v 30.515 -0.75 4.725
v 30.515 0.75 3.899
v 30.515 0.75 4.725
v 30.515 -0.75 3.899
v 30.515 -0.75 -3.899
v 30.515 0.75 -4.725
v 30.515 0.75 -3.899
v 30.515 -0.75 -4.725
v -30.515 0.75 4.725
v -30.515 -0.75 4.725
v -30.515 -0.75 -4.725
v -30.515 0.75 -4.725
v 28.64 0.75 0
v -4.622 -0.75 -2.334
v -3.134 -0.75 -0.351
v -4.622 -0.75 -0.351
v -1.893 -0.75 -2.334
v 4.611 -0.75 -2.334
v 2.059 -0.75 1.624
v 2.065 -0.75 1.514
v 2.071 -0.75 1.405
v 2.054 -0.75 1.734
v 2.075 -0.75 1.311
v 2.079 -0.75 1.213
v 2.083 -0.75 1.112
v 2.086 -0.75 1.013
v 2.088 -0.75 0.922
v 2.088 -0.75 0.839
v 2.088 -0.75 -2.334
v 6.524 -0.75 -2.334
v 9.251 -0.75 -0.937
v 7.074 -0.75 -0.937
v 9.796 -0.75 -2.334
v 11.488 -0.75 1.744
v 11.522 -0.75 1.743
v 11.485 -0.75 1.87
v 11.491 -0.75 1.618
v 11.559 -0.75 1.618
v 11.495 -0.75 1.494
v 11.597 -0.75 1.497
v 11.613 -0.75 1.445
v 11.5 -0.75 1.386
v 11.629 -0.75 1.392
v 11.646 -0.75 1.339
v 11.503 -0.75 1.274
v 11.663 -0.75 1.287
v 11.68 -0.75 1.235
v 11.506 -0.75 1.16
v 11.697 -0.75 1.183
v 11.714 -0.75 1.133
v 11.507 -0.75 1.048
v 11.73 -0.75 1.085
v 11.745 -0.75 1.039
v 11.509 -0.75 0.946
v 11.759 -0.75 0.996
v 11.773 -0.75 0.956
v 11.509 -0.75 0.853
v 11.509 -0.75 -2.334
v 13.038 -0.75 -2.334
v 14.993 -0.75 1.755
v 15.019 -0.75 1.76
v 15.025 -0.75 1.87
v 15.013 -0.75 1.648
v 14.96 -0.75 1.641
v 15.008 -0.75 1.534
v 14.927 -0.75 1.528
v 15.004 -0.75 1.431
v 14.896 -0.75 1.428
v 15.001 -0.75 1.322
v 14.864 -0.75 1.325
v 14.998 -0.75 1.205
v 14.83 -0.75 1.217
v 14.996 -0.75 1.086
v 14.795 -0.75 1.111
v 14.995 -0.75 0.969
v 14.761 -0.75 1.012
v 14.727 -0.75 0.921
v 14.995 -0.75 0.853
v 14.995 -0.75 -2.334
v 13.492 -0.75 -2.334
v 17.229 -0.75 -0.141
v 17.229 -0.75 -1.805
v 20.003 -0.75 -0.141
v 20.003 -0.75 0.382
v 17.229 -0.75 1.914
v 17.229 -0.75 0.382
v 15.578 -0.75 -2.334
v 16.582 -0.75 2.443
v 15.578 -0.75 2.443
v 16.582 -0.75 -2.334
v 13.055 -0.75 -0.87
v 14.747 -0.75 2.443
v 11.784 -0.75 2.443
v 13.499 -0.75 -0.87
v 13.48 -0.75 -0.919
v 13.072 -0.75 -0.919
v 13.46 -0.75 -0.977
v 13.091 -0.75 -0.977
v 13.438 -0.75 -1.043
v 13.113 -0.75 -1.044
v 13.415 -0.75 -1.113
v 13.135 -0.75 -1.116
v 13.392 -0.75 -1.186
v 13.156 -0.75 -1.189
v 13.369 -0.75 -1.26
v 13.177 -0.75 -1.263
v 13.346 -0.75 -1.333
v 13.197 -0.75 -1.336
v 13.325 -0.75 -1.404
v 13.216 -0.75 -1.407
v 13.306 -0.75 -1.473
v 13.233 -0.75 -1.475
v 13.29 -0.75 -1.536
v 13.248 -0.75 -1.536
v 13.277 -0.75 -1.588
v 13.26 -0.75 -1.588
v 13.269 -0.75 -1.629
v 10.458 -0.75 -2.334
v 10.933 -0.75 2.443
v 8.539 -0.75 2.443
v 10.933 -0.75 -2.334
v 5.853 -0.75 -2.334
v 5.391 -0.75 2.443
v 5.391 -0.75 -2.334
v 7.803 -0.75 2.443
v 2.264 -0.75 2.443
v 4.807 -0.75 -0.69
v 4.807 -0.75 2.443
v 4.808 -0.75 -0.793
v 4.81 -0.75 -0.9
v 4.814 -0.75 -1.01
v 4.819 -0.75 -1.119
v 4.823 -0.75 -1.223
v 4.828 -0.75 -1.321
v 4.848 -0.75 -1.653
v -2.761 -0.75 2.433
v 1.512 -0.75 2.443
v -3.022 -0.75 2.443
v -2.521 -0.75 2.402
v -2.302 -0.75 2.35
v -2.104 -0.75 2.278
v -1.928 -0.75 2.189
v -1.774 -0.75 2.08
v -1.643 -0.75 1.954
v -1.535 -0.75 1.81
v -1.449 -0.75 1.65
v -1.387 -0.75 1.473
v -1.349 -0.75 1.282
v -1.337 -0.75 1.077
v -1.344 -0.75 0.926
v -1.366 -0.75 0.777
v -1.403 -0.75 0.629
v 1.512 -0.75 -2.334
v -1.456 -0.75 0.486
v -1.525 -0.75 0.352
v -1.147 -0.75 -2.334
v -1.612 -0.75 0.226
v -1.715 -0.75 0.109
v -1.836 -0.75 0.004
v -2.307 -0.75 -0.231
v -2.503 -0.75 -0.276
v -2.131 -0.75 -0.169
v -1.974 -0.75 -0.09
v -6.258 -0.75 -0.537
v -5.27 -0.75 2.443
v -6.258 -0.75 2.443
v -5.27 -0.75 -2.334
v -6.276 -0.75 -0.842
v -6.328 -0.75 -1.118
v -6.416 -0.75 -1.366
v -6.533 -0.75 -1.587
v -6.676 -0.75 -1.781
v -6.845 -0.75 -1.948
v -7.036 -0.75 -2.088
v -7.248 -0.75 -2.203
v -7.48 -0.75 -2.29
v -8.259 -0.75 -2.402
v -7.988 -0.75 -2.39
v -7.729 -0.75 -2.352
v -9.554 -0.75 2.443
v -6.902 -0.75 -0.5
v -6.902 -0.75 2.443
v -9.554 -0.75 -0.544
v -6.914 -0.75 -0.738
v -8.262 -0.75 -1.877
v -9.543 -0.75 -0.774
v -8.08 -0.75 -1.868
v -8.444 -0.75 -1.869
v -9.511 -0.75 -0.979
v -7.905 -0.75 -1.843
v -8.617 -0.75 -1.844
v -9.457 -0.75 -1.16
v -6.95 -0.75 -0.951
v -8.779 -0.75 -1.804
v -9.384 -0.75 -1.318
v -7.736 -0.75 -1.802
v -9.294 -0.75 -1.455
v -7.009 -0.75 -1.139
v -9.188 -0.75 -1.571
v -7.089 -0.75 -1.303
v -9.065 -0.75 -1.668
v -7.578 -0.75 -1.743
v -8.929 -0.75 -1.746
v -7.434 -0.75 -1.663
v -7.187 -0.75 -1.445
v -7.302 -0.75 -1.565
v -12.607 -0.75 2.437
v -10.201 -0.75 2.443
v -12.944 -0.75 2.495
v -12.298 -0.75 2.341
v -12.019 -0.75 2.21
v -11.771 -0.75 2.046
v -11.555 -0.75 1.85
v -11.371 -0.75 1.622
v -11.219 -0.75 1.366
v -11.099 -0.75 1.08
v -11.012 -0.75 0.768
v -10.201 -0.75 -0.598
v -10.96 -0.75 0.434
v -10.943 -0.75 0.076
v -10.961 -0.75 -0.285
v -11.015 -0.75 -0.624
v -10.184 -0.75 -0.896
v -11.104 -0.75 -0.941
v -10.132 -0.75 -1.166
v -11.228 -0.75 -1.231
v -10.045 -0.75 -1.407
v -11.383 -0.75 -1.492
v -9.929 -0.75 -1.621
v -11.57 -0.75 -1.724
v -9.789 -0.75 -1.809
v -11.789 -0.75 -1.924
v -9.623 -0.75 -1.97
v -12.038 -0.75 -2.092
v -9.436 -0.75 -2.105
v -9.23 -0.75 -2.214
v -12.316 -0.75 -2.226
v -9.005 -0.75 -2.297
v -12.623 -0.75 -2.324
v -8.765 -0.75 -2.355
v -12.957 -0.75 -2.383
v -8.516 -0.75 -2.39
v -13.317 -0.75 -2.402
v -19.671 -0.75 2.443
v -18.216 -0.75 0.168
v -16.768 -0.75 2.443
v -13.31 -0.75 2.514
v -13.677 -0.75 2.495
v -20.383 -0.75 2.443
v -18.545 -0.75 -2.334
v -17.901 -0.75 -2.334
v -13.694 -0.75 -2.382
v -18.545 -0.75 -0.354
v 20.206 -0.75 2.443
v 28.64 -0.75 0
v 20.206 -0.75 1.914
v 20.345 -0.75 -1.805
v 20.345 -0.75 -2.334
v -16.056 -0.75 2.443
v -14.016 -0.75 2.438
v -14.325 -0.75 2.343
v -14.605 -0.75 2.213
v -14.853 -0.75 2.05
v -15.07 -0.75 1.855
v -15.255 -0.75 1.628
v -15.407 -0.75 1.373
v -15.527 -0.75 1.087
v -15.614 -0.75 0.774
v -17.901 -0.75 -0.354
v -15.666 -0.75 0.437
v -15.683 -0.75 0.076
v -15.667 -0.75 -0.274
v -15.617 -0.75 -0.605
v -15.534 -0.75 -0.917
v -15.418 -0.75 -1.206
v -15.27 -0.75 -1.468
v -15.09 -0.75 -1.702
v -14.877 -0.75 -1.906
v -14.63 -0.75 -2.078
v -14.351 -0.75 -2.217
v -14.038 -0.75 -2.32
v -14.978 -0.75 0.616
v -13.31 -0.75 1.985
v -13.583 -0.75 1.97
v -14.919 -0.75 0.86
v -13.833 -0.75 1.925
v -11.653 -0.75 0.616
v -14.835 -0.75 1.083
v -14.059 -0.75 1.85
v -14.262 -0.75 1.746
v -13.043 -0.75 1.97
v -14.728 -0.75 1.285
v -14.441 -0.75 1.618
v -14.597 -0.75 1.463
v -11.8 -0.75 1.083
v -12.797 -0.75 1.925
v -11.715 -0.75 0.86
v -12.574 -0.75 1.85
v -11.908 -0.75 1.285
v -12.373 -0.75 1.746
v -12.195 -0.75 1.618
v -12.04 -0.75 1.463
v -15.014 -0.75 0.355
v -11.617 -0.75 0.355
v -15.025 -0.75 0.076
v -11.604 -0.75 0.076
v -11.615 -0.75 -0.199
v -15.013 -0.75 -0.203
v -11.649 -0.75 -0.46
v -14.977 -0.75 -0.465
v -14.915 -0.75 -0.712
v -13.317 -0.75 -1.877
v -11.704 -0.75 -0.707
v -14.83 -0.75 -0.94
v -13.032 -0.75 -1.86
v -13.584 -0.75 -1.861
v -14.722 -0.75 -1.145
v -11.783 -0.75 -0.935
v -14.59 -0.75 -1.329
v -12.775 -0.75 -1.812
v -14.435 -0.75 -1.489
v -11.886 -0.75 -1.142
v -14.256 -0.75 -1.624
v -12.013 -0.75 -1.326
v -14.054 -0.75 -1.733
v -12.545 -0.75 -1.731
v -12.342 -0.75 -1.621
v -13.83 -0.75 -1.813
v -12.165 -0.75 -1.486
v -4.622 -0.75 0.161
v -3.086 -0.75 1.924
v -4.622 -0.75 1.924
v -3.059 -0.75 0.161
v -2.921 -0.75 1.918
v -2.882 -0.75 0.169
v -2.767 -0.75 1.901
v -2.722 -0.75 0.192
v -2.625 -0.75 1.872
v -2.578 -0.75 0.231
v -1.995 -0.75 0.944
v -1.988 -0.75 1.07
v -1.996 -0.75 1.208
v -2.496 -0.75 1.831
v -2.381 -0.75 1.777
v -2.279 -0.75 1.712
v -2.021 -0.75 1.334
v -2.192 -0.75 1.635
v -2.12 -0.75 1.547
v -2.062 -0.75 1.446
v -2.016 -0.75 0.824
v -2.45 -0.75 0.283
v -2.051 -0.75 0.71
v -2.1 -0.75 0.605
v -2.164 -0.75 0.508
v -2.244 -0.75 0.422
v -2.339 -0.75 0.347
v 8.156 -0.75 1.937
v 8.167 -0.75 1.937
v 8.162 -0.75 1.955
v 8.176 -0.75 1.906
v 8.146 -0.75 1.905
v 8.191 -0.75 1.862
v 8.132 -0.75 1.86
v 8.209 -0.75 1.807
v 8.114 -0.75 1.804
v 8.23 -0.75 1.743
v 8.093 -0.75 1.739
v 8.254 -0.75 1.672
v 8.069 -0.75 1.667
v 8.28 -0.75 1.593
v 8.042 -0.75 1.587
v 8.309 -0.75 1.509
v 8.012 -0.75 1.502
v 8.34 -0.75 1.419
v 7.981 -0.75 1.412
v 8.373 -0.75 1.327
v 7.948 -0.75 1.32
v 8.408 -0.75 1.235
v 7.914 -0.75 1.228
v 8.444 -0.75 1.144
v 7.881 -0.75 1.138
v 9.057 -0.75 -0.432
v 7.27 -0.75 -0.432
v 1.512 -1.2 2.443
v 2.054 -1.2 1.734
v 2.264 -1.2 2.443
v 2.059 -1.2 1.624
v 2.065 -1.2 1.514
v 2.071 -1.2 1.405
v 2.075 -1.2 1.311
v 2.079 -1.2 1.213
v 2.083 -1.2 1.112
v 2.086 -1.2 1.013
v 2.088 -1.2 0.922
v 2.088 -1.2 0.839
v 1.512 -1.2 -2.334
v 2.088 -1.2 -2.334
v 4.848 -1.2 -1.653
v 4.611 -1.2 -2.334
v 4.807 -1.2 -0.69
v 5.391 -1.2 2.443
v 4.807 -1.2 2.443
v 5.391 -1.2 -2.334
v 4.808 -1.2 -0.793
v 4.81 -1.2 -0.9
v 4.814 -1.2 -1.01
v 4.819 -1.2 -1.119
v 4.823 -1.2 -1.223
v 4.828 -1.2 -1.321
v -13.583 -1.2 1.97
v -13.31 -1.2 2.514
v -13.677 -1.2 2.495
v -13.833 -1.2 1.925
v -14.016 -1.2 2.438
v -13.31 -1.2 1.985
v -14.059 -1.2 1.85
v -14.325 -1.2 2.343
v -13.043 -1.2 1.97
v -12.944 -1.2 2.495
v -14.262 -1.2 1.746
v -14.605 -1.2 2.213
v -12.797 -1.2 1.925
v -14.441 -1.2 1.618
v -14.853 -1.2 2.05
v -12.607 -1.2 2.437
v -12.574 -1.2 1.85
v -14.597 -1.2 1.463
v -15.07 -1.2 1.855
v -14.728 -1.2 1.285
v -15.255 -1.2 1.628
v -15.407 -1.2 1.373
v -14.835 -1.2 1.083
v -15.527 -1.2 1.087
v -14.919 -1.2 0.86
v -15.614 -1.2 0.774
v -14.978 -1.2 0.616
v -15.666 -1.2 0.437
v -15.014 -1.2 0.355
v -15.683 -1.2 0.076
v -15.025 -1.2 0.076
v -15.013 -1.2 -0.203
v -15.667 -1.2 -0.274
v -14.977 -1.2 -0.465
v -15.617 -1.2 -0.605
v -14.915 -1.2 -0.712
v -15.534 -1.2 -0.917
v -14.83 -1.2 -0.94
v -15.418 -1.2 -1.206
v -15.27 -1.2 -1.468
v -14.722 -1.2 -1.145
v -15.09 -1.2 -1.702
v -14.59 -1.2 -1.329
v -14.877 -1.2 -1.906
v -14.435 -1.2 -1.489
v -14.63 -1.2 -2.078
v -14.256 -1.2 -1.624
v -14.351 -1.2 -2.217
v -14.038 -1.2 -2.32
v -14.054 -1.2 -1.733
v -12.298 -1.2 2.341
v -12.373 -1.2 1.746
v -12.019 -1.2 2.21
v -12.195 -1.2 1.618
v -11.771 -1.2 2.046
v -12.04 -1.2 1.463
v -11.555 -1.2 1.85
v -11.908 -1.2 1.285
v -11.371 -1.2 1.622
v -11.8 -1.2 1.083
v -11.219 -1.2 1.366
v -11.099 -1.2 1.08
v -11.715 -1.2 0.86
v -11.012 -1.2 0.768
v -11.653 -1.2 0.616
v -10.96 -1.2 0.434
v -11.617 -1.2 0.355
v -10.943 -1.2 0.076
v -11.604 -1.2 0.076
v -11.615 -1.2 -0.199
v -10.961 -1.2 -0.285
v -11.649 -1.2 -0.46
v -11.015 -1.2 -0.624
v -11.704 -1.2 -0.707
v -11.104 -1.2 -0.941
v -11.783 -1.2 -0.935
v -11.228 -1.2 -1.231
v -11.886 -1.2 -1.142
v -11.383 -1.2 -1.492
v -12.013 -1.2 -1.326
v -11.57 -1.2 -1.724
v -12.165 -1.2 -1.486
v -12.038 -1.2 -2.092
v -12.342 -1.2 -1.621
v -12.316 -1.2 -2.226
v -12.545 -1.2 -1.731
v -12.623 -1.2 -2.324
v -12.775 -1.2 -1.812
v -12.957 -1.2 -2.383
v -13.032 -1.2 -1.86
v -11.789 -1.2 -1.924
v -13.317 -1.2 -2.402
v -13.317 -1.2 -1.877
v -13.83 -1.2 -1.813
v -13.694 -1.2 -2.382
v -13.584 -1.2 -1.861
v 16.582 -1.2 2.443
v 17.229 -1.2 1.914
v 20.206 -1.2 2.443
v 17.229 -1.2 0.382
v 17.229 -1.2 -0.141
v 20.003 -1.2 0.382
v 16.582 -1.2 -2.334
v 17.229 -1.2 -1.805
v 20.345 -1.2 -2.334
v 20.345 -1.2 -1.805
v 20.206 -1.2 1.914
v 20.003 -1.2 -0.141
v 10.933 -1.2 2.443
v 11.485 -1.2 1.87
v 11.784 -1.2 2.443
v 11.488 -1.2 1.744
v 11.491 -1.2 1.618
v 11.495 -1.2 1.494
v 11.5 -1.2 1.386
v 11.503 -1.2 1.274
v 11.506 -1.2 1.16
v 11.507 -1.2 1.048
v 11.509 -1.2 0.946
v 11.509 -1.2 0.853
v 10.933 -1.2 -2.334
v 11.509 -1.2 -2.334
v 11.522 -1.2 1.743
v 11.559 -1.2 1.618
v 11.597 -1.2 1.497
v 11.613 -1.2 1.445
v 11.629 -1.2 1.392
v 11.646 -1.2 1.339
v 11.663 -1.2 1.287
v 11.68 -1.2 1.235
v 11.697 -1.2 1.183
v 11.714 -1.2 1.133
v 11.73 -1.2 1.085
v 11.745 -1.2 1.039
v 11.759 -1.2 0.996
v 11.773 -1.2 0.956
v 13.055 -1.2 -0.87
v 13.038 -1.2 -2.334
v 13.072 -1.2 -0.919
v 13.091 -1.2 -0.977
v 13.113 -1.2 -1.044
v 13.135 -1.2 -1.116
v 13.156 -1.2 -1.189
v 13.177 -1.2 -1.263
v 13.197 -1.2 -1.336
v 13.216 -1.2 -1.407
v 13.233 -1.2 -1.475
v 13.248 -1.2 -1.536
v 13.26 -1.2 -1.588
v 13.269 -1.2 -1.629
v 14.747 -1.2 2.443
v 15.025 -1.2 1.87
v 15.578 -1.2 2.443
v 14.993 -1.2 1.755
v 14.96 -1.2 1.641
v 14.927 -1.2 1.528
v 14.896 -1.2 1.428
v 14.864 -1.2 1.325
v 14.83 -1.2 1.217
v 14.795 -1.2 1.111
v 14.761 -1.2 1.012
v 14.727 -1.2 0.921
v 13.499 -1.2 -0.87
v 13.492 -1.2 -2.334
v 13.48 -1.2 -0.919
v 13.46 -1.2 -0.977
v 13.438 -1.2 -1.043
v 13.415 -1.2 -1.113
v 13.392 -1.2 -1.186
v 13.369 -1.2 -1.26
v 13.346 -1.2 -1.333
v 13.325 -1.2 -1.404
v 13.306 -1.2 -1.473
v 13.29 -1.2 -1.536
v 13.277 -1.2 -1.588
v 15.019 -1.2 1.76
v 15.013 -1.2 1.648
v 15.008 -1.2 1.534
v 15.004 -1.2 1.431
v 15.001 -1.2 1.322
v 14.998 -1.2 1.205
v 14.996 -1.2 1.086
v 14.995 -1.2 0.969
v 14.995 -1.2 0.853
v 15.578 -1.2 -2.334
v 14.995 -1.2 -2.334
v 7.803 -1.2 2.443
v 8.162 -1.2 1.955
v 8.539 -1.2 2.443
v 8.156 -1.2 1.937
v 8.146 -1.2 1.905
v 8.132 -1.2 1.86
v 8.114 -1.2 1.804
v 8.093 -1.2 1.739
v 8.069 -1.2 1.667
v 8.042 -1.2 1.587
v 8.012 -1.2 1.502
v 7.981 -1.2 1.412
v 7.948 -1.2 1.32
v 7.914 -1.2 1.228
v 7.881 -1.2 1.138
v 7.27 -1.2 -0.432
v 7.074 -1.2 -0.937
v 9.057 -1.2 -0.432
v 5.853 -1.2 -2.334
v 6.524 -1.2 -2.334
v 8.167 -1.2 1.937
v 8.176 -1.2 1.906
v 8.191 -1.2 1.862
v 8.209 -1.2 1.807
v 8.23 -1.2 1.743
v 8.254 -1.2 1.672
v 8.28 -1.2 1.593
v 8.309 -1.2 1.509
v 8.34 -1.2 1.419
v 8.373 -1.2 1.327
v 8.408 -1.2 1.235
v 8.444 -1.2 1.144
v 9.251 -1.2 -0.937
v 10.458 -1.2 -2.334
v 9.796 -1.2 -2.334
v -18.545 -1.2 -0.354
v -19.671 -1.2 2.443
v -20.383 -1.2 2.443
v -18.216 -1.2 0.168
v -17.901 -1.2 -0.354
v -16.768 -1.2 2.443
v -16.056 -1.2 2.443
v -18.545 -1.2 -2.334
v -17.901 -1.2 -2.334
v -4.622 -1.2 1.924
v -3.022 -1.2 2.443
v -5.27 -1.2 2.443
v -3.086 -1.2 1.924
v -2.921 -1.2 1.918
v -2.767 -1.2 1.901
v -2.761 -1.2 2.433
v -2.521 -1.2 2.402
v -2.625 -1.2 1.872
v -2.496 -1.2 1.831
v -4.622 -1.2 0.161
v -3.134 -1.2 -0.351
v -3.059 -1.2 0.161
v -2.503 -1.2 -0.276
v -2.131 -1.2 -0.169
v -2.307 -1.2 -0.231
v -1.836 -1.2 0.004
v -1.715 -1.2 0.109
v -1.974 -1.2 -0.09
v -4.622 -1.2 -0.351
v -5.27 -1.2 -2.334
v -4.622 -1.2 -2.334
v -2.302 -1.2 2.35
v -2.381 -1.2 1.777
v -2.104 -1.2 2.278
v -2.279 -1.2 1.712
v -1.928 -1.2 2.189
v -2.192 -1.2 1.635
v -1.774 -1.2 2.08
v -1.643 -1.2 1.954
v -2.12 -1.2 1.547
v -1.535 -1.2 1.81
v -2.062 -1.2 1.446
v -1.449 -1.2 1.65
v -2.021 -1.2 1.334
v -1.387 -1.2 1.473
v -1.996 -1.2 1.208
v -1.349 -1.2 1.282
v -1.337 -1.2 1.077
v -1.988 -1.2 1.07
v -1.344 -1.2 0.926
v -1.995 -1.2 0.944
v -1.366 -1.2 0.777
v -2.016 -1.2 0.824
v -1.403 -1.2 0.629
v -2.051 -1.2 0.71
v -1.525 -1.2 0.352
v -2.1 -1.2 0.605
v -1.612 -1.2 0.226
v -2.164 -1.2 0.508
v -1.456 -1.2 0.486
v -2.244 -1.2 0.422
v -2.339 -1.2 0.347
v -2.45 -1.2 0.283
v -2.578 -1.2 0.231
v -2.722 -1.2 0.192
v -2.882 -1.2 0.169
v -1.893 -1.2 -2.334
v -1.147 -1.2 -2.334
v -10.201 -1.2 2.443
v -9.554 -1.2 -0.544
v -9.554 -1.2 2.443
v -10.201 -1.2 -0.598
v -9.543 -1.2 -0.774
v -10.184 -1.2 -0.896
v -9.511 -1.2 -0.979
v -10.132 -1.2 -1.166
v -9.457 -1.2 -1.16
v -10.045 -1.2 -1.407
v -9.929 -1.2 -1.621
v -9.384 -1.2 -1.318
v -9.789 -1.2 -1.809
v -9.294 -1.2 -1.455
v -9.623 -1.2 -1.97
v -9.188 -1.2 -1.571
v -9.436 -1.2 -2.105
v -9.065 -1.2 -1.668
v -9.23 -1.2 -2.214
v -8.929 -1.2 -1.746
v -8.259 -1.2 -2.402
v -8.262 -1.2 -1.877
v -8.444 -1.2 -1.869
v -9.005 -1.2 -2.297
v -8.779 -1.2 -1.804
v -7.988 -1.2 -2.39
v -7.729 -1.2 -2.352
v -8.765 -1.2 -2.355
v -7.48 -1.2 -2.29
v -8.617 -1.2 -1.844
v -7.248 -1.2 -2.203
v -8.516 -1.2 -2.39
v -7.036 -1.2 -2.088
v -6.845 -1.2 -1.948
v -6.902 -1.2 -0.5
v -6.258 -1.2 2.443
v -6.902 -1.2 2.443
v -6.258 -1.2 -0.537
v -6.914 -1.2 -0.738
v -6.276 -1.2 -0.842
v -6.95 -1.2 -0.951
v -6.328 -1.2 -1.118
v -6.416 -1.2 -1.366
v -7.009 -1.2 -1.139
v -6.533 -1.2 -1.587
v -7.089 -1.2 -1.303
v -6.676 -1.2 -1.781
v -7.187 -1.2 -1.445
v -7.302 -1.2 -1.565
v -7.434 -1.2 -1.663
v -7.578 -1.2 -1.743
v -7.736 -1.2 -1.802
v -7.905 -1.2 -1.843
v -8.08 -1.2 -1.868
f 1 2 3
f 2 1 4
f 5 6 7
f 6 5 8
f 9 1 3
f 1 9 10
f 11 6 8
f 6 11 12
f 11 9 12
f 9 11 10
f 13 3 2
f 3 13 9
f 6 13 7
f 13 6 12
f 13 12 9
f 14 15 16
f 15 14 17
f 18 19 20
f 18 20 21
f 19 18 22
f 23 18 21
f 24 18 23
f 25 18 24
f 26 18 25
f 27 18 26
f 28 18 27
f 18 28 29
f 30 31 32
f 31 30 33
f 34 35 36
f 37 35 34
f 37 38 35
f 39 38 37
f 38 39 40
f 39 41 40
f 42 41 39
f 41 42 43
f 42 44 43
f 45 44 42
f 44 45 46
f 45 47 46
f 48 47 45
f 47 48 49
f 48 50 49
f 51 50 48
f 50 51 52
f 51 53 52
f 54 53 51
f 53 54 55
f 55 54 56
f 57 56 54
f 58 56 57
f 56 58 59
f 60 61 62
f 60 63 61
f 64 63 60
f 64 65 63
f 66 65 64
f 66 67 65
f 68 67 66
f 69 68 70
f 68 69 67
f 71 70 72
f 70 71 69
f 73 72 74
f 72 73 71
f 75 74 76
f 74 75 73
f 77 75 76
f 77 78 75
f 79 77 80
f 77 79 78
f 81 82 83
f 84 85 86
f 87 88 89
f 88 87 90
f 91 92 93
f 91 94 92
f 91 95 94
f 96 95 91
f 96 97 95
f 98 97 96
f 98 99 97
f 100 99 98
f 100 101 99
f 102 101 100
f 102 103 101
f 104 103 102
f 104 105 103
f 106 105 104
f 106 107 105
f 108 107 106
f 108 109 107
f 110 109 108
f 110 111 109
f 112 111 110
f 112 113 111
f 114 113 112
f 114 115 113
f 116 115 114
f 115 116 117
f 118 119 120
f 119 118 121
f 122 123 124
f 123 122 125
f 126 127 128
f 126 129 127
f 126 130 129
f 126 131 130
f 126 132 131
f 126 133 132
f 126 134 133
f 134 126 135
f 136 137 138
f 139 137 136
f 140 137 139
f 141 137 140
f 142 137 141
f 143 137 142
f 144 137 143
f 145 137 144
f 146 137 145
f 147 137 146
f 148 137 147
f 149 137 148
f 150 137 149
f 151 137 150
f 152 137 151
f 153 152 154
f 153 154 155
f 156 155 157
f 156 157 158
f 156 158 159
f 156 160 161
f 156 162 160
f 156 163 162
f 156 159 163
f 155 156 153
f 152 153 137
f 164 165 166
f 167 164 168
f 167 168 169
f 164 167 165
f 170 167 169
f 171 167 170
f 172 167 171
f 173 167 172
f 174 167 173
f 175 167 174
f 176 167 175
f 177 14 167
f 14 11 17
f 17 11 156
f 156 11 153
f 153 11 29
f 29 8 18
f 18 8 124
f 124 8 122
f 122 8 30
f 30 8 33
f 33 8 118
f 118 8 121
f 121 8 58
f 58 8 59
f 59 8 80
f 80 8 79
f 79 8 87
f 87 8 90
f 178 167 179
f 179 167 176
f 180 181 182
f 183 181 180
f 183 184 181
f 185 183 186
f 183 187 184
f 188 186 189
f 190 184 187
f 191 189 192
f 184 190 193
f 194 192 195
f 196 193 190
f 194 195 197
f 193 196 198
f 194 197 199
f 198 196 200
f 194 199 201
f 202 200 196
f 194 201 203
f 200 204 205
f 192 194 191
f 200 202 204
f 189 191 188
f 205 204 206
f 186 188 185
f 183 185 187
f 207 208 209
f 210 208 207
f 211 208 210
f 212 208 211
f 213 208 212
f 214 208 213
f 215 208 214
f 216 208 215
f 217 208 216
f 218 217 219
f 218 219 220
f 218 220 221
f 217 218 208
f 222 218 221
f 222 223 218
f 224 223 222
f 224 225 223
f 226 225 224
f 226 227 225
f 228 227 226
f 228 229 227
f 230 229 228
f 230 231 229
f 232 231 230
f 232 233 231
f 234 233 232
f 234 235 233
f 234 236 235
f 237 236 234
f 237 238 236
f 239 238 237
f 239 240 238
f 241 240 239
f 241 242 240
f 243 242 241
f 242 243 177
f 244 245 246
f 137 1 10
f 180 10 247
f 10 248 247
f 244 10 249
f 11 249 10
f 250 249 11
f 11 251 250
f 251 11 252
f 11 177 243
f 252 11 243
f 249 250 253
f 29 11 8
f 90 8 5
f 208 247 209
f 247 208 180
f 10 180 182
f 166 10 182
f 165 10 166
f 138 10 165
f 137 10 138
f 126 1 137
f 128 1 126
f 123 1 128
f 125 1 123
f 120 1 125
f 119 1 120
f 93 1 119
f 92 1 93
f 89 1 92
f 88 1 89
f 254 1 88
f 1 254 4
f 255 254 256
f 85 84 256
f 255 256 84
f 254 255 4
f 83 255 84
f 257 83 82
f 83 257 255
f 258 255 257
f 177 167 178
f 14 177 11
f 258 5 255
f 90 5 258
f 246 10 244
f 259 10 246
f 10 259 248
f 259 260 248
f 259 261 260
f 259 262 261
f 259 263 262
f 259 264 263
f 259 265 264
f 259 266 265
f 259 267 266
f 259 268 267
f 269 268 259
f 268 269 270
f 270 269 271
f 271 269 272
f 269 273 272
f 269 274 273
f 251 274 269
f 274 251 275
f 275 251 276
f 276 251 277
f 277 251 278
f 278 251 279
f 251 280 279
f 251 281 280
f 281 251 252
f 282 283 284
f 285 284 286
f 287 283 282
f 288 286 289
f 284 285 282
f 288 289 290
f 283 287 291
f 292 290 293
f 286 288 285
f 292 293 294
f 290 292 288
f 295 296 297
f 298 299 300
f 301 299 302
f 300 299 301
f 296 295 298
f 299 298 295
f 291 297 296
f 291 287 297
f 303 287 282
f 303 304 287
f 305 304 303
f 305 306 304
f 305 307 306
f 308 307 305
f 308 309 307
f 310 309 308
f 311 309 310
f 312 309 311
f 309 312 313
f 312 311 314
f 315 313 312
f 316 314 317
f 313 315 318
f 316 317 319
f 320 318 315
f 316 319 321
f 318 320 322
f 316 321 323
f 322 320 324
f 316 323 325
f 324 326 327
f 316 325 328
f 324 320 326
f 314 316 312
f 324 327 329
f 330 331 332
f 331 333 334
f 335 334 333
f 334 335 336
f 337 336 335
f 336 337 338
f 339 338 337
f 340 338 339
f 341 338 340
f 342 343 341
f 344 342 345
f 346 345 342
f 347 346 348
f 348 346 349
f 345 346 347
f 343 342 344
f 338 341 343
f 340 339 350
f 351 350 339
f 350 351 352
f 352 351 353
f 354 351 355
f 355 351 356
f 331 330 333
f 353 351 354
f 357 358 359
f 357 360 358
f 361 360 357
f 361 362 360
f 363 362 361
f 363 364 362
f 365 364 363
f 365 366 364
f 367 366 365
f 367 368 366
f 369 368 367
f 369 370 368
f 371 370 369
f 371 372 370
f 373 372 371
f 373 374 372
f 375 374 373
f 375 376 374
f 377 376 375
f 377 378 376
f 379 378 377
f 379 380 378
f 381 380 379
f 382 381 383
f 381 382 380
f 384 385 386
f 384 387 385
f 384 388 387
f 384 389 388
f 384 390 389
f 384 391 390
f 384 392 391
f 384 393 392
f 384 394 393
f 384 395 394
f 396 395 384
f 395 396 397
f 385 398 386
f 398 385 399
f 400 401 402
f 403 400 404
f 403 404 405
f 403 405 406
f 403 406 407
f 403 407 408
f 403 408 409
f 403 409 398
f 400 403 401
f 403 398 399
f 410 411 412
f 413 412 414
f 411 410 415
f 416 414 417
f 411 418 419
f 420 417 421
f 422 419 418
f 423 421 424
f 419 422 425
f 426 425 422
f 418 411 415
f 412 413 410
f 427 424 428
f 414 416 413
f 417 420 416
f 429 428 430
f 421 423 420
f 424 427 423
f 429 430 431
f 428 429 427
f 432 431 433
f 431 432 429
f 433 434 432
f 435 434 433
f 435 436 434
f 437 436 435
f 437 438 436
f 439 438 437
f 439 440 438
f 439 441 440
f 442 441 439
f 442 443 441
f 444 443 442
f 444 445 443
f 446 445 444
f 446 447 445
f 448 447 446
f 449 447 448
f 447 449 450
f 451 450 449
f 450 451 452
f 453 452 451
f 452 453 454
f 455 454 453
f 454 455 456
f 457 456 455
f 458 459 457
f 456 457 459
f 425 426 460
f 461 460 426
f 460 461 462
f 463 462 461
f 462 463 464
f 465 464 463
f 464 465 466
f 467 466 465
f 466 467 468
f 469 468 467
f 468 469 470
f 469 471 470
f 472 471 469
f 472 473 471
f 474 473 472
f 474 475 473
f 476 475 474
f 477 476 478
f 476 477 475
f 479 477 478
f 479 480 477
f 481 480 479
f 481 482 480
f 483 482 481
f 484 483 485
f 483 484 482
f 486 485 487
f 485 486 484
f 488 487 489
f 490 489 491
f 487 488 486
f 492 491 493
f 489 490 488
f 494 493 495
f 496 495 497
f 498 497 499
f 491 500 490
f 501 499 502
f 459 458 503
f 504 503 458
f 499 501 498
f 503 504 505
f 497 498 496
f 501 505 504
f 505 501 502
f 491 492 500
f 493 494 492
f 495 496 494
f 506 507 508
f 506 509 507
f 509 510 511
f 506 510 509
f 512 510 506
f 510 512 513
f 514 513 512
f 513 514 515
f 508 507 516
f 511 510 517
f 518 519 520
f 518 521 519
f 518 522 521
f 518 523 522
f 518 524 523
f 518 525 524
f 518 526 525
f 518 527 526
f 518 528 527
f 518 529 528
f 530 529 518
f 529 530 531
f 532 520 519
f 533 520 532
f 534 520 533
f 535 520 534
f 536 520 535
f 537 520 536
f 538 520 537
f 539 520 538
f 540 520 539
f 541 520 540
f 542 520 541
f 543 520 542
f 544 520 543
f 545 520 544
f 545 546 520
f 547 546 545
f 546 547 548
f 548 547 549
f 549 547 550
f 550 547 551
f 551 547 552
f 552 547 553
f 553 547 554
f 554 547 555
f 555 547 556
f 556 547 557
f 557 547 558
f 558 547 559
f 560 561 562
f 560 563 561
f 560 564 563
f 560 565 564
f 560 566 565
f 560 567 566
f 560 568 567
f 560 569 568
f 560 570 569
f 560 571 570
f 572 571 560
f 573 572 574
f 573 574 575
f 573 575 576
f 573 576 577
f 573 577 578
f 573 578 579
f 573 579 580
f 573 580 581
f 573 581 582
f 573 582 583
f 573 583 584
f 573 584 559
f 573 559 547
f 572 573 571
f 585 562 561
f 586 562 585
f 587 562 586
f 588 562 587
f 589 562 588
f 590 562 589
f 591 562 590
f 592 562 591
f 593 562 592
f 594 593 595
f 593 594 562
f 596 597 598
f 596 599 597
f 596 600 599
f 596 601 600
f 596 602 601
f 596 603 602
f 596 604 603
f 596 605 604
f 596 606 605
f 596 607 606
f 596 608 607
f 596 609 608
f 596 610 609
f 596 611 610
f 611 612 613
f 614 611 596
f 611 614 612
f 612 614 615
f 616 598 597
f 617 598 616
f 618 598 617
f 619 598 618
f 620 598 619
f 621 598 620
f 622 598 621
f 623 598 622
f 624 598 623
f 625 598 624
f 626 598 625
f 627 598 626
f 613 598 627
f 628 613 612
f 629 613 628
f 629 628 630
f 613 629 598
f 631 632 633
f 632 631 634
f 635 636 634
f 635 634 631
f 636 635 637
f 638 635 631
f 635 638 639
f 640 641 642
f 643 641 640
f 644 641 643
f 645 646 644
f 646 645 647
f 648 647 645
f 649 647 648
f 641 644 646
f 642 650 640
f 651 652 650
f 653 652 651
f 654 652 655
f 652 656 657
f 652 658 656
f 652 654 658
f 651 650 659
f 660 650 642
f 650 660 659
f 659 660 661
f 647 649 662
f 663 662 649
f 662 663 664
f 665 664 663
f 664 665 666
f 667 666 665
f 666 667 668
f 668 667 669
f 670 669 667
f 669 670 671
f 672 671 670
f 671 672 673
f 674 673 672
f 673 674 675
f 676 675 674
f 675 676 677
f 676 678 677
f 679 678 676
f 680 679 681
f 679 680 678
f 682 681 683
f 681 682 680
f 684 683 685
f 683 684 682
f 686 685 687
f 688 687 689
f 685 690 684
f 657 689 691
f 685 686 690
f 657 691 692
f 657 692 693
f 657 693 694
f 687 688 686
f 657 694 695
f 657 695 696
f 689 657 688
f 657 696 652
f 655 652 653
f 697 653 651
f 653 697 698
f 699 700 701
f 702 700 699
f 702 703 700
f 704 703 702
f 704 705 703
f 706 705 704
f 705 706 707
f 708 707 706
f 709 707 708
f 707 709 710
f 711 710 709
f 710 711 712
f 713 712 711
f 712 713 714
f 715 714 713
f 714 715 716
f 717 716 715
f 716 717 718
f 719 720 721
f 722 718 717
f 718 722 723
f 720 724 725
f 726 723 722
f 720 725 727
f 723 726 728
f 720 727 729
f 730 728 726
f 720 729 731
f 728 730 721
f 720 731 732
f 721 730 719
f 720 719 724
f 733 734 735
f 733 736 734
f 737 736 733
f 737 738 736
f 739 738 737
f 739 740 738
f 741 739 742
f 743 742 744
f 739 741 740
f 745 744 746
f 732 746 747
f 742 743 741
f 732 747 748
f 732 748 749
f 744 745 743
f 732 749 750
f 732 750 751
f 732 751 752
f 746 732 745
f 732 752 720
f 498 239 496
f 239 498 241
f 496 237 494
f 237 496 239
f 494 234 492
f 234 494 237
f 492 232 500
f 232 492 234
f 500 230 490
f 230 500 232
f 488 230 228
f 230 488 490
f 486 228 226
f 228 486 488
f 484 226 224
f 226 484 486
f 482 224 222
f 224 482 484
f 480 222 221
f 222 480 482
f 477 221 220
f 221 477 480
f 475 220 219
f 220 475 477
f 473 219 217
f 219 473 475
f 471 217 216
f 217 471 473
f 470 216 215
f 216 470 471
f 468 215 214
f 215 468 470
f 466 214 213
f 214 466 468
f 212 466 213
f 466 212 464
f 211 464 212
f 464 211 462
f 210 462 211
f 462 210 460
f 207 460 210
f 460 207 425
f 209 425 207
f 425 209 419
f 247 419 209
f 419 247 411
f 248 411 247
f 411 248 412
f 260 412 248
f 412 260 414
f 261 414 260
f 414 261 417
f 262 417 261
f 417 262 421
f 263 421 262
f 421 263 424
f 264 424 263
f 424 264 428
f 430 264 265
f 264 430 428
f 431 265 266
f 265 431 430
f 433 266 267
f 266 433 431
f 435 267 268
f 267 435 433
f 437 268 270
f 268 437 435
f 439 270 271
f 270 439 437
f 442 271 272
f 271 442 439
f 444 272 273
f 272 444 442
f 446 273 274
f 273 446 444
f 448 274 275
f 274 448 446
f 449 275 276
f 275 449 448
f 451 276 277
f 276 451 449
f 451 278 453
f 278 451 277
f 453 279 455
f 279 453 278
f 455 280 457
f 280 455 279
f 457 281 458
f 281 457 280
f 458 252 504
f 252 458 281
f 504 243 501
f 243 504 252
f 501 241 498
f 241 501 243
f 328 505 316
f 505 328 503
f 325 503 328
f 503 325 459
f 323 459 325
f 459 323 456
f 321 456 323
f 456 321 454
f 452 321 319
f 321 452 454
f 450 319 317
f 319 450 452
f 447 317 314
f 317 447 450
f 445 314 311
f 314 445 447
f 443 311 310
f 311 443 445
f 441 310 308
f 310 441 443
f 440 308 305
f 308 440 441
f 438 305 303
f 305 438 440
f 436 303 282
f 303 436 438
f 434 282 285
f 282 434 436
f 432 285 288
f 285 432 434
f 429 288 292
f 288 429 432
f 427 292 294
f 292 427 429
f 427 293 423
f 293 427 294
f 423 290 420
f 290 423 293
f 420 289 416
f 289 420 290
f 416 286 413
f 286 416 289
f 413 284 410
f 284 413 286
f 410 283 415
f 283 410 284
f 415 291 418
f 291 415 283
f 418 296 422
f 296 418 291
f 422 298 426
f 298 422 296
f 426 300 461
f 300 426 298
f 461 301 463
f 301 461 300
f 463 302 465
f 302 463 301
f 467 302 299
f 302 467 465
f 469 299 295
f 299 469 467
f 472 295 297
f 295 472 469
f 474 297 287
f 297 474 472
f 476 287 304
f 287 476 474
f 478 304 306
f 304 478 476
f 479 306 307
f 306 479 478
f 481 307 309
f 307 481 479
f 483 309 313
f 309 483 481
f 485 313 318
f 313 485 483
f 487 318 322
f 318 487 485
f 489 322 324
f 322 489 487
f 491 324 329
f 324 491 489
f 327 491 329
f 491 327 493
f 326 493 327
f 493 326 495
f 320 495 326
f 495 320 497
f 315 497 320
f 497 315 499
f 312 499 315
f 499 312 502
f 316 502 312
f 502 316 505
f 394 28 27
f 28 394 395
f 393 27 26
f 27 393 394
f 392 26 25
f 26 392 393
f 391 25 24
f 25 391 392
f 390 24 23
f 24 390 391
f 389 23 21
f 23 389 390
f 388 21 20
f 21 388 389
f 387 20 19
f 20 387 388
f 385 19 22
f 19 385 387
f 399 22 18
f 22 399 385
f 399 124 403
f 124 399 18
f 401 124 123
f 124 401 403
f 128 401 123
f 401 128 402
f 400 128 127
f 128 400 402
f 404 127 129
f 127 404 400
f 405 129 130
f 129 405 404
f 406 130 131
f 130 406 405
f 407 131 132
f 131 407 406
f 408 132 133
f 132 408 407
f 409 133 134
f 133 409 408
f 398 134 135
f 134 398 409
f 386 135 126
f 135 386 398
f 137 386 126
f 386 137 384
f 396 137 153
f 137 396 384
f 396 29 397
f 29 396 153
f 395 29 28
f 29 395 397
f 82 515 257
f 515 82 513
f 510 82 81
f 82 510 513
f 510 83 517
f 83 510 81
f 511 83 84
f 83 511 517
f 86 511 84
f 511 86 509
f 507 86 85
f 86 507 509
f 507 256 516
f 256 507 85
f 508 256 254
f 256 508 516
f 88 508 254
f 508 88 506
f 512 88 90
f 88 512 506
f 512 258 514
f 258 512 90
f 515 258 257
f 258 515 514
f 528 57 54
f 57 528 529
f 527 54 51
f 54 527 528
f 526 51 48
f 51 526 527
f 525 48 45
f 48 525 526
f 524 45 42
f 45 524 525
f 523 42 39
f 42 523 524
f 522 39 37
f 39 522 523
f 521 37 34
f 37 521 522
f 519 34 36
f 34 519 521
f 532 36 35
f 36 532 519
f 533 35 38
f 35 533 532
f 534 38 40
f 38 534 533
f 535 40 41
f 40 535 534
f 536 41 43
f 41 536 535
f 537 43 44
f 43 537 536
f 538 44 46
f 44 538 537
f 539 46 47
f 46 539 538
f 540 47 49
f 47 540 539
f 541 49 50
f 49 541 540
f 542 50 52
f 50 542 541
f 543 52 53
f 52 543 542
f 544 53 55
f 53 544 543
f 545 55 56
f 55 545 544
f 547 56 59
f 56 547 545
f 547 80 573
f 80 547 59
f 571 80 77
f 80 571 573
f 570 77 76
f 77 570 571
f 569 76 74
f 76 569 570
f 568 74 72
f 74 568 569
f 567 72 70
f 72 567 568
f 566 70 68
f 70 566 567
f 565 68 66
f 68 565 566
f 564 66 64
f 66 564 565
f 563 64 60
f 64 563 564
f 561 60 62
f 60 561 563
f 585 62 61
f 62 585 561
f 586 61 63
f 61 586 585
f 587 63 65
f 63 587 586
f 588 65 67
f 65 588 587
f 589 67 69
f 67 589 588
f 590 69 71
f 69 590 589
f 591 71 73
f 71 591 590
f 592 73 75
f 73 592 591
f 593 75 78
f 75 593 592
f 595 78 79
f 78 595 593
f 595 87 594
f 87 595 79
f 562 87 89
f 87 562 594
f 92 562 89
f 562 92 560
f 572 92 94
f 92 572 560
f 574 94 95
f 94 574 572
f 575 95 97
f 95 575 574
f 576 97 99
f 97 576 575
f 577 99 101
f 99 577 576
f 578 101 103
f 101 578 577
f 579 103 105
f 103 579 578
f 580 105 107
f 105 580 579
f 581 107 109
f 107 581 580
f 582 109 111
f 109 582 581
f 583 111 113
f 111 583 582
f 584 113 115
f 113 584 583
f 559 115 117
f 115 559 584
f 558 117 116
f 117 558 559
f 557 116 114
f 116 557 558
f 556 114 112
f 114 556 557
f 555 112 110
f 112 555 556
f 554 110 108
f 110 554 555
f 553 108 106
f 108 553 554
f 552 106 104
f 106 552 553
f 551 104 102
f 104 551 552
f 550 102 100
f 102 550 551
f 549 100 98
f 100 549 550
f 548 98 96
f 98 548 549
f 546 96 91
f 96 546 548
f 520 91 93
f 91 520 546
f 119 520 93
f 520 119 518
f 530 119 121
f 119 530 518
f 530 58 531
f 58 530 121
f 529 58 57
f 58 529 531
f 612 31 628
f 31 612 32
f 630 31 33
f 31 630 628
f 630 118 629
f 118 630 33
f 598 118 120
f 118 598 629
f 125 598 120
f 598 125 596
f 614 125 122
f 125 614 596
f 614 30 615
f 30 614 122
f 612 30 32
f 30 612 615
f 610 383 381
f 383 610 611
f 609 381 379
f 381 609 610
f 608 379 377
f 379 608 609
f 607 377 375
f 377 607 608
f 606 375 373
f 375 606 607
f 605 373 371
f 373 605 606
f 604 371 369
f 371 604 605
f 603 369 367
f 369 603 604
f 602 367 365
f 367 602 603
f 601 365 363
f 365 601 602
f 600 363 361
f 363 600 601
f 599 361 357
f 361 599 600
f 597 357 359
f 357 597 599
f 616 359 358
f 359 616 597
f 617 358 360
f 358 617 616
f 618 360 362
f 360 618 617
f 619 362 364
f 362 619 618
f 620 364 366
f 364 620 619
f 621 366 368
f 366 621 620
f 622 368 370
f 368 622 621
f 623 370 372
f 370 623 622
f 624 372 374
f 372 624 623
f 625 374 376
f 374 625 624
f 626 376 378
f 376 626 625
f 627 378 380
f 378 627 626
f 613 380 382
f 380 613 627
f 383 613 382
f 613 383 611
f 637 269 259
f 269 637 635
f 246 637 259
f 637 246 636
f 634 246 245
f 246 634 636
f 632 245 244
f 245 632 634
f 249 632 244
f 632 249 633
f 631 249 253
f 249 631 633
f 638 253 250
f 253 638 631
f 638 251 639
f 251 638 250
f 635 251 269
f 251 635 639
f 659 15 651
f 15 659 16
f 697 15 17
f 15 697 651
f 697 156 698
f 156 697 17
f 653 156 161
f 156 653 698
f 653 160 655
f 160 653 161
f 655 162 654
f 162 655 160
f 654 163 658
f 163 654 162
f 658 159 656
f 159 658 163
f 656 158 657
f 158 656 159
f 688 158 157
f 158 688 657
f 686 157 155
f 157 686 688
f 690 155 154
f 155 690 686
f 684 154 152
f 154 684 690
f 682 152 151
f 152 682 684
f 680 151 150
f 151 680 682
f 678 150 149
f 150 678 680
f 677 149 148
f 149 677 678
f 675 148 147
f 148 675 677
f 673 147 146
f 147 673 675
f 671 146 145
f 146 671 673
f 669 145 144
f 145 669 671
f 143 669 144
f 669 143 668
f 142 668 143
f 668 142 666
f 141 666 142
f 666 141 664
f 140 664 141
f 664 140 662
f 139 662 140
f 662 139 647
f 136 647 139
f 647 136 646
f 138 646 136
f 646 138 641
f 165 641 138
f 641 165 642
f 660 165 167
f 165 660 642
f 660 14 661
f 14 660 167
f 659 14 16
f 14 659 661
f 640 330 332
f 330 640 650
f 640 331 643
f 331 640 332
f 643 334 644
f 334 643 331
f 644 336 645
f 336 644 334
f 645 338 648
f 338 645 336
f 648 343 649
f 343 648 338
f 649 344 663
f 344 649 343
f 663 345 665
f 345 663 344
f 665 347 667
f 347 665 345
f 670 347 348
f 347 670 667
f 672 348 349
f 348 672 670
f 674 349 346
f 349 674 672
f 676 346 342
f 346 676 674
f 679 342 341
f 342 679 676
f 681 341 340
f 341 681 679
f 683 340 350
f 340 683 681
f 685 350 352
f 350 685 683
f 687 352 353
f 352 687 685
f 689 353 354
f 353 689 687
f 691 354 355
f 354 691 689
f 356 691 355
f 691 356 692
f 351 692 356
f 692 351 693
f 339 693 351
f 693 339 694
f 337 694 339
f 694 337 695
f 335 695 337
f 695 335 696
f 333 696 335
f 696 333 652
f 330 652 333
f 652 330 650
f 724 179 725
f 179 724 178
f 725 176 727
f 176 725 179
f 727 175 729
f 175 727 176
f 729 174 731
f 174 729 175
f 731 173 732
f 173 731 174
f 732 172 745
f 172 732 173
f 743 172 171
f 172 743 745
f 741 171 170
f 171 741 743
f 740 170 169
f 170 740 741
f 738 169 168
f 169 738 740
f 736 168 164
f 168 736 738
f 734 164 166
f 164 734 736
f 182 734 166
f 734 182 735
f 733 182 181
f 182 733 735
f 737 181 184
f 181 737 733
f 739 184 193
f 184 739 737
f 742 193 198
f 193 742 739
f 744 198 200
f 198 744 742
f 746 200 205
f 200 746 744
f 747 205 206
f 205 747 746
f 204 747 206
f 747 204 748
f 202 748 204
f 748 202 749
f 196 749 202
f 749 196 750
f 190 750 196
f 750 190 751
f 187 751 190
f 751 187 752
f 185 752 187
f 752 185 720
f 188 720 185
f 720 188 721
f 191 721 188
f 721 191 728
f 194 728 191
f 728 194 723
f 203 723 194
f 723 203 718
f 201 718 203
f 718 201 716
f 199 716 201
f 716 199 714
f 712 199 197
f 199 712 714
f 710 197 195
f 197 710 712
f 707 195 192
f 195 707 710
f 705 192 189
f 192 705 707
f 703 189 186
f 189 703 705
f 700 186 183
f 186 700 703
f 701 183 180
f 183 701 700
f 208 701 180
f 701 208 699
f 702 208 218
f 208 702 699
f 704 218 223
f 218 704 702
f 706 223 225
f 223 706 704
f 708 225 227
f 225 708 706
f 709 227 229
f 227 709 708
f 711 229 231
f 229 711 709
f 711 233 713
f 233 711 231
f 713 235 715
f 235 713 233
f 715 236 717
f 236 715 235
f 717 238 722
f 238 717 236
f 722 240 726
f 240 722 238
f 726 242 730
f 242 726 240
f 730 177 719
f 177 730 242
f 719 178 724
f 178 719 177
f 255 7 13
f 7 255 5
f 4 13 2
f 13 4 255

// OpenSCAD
// Textadapter

Textgroesse = 5;
text = "YOUR NAME";


module letter(l) {
  linear_extrude(height = 0.45) {
    text(l, size = Textgroesse, halign = "center", valign = "center", $fn = 16);
  }
}

difference() {
  union() {
      color("gray") cube([61.03, 1.5, 9.45], center =(true));
    translate([0, -0.75, 0]) rotate([90, 0, 0]) letter(text);
  }
      rotate([90,0,0])
    translate([28.64,0,0])
    linear_extrude(height = 10, center = true, convexity = 10, twist = 0)
polygon([[0,0],[5.41,-11.25],[5.41,11.25]],paths=[[0,1,2]], convexity=3);
}
